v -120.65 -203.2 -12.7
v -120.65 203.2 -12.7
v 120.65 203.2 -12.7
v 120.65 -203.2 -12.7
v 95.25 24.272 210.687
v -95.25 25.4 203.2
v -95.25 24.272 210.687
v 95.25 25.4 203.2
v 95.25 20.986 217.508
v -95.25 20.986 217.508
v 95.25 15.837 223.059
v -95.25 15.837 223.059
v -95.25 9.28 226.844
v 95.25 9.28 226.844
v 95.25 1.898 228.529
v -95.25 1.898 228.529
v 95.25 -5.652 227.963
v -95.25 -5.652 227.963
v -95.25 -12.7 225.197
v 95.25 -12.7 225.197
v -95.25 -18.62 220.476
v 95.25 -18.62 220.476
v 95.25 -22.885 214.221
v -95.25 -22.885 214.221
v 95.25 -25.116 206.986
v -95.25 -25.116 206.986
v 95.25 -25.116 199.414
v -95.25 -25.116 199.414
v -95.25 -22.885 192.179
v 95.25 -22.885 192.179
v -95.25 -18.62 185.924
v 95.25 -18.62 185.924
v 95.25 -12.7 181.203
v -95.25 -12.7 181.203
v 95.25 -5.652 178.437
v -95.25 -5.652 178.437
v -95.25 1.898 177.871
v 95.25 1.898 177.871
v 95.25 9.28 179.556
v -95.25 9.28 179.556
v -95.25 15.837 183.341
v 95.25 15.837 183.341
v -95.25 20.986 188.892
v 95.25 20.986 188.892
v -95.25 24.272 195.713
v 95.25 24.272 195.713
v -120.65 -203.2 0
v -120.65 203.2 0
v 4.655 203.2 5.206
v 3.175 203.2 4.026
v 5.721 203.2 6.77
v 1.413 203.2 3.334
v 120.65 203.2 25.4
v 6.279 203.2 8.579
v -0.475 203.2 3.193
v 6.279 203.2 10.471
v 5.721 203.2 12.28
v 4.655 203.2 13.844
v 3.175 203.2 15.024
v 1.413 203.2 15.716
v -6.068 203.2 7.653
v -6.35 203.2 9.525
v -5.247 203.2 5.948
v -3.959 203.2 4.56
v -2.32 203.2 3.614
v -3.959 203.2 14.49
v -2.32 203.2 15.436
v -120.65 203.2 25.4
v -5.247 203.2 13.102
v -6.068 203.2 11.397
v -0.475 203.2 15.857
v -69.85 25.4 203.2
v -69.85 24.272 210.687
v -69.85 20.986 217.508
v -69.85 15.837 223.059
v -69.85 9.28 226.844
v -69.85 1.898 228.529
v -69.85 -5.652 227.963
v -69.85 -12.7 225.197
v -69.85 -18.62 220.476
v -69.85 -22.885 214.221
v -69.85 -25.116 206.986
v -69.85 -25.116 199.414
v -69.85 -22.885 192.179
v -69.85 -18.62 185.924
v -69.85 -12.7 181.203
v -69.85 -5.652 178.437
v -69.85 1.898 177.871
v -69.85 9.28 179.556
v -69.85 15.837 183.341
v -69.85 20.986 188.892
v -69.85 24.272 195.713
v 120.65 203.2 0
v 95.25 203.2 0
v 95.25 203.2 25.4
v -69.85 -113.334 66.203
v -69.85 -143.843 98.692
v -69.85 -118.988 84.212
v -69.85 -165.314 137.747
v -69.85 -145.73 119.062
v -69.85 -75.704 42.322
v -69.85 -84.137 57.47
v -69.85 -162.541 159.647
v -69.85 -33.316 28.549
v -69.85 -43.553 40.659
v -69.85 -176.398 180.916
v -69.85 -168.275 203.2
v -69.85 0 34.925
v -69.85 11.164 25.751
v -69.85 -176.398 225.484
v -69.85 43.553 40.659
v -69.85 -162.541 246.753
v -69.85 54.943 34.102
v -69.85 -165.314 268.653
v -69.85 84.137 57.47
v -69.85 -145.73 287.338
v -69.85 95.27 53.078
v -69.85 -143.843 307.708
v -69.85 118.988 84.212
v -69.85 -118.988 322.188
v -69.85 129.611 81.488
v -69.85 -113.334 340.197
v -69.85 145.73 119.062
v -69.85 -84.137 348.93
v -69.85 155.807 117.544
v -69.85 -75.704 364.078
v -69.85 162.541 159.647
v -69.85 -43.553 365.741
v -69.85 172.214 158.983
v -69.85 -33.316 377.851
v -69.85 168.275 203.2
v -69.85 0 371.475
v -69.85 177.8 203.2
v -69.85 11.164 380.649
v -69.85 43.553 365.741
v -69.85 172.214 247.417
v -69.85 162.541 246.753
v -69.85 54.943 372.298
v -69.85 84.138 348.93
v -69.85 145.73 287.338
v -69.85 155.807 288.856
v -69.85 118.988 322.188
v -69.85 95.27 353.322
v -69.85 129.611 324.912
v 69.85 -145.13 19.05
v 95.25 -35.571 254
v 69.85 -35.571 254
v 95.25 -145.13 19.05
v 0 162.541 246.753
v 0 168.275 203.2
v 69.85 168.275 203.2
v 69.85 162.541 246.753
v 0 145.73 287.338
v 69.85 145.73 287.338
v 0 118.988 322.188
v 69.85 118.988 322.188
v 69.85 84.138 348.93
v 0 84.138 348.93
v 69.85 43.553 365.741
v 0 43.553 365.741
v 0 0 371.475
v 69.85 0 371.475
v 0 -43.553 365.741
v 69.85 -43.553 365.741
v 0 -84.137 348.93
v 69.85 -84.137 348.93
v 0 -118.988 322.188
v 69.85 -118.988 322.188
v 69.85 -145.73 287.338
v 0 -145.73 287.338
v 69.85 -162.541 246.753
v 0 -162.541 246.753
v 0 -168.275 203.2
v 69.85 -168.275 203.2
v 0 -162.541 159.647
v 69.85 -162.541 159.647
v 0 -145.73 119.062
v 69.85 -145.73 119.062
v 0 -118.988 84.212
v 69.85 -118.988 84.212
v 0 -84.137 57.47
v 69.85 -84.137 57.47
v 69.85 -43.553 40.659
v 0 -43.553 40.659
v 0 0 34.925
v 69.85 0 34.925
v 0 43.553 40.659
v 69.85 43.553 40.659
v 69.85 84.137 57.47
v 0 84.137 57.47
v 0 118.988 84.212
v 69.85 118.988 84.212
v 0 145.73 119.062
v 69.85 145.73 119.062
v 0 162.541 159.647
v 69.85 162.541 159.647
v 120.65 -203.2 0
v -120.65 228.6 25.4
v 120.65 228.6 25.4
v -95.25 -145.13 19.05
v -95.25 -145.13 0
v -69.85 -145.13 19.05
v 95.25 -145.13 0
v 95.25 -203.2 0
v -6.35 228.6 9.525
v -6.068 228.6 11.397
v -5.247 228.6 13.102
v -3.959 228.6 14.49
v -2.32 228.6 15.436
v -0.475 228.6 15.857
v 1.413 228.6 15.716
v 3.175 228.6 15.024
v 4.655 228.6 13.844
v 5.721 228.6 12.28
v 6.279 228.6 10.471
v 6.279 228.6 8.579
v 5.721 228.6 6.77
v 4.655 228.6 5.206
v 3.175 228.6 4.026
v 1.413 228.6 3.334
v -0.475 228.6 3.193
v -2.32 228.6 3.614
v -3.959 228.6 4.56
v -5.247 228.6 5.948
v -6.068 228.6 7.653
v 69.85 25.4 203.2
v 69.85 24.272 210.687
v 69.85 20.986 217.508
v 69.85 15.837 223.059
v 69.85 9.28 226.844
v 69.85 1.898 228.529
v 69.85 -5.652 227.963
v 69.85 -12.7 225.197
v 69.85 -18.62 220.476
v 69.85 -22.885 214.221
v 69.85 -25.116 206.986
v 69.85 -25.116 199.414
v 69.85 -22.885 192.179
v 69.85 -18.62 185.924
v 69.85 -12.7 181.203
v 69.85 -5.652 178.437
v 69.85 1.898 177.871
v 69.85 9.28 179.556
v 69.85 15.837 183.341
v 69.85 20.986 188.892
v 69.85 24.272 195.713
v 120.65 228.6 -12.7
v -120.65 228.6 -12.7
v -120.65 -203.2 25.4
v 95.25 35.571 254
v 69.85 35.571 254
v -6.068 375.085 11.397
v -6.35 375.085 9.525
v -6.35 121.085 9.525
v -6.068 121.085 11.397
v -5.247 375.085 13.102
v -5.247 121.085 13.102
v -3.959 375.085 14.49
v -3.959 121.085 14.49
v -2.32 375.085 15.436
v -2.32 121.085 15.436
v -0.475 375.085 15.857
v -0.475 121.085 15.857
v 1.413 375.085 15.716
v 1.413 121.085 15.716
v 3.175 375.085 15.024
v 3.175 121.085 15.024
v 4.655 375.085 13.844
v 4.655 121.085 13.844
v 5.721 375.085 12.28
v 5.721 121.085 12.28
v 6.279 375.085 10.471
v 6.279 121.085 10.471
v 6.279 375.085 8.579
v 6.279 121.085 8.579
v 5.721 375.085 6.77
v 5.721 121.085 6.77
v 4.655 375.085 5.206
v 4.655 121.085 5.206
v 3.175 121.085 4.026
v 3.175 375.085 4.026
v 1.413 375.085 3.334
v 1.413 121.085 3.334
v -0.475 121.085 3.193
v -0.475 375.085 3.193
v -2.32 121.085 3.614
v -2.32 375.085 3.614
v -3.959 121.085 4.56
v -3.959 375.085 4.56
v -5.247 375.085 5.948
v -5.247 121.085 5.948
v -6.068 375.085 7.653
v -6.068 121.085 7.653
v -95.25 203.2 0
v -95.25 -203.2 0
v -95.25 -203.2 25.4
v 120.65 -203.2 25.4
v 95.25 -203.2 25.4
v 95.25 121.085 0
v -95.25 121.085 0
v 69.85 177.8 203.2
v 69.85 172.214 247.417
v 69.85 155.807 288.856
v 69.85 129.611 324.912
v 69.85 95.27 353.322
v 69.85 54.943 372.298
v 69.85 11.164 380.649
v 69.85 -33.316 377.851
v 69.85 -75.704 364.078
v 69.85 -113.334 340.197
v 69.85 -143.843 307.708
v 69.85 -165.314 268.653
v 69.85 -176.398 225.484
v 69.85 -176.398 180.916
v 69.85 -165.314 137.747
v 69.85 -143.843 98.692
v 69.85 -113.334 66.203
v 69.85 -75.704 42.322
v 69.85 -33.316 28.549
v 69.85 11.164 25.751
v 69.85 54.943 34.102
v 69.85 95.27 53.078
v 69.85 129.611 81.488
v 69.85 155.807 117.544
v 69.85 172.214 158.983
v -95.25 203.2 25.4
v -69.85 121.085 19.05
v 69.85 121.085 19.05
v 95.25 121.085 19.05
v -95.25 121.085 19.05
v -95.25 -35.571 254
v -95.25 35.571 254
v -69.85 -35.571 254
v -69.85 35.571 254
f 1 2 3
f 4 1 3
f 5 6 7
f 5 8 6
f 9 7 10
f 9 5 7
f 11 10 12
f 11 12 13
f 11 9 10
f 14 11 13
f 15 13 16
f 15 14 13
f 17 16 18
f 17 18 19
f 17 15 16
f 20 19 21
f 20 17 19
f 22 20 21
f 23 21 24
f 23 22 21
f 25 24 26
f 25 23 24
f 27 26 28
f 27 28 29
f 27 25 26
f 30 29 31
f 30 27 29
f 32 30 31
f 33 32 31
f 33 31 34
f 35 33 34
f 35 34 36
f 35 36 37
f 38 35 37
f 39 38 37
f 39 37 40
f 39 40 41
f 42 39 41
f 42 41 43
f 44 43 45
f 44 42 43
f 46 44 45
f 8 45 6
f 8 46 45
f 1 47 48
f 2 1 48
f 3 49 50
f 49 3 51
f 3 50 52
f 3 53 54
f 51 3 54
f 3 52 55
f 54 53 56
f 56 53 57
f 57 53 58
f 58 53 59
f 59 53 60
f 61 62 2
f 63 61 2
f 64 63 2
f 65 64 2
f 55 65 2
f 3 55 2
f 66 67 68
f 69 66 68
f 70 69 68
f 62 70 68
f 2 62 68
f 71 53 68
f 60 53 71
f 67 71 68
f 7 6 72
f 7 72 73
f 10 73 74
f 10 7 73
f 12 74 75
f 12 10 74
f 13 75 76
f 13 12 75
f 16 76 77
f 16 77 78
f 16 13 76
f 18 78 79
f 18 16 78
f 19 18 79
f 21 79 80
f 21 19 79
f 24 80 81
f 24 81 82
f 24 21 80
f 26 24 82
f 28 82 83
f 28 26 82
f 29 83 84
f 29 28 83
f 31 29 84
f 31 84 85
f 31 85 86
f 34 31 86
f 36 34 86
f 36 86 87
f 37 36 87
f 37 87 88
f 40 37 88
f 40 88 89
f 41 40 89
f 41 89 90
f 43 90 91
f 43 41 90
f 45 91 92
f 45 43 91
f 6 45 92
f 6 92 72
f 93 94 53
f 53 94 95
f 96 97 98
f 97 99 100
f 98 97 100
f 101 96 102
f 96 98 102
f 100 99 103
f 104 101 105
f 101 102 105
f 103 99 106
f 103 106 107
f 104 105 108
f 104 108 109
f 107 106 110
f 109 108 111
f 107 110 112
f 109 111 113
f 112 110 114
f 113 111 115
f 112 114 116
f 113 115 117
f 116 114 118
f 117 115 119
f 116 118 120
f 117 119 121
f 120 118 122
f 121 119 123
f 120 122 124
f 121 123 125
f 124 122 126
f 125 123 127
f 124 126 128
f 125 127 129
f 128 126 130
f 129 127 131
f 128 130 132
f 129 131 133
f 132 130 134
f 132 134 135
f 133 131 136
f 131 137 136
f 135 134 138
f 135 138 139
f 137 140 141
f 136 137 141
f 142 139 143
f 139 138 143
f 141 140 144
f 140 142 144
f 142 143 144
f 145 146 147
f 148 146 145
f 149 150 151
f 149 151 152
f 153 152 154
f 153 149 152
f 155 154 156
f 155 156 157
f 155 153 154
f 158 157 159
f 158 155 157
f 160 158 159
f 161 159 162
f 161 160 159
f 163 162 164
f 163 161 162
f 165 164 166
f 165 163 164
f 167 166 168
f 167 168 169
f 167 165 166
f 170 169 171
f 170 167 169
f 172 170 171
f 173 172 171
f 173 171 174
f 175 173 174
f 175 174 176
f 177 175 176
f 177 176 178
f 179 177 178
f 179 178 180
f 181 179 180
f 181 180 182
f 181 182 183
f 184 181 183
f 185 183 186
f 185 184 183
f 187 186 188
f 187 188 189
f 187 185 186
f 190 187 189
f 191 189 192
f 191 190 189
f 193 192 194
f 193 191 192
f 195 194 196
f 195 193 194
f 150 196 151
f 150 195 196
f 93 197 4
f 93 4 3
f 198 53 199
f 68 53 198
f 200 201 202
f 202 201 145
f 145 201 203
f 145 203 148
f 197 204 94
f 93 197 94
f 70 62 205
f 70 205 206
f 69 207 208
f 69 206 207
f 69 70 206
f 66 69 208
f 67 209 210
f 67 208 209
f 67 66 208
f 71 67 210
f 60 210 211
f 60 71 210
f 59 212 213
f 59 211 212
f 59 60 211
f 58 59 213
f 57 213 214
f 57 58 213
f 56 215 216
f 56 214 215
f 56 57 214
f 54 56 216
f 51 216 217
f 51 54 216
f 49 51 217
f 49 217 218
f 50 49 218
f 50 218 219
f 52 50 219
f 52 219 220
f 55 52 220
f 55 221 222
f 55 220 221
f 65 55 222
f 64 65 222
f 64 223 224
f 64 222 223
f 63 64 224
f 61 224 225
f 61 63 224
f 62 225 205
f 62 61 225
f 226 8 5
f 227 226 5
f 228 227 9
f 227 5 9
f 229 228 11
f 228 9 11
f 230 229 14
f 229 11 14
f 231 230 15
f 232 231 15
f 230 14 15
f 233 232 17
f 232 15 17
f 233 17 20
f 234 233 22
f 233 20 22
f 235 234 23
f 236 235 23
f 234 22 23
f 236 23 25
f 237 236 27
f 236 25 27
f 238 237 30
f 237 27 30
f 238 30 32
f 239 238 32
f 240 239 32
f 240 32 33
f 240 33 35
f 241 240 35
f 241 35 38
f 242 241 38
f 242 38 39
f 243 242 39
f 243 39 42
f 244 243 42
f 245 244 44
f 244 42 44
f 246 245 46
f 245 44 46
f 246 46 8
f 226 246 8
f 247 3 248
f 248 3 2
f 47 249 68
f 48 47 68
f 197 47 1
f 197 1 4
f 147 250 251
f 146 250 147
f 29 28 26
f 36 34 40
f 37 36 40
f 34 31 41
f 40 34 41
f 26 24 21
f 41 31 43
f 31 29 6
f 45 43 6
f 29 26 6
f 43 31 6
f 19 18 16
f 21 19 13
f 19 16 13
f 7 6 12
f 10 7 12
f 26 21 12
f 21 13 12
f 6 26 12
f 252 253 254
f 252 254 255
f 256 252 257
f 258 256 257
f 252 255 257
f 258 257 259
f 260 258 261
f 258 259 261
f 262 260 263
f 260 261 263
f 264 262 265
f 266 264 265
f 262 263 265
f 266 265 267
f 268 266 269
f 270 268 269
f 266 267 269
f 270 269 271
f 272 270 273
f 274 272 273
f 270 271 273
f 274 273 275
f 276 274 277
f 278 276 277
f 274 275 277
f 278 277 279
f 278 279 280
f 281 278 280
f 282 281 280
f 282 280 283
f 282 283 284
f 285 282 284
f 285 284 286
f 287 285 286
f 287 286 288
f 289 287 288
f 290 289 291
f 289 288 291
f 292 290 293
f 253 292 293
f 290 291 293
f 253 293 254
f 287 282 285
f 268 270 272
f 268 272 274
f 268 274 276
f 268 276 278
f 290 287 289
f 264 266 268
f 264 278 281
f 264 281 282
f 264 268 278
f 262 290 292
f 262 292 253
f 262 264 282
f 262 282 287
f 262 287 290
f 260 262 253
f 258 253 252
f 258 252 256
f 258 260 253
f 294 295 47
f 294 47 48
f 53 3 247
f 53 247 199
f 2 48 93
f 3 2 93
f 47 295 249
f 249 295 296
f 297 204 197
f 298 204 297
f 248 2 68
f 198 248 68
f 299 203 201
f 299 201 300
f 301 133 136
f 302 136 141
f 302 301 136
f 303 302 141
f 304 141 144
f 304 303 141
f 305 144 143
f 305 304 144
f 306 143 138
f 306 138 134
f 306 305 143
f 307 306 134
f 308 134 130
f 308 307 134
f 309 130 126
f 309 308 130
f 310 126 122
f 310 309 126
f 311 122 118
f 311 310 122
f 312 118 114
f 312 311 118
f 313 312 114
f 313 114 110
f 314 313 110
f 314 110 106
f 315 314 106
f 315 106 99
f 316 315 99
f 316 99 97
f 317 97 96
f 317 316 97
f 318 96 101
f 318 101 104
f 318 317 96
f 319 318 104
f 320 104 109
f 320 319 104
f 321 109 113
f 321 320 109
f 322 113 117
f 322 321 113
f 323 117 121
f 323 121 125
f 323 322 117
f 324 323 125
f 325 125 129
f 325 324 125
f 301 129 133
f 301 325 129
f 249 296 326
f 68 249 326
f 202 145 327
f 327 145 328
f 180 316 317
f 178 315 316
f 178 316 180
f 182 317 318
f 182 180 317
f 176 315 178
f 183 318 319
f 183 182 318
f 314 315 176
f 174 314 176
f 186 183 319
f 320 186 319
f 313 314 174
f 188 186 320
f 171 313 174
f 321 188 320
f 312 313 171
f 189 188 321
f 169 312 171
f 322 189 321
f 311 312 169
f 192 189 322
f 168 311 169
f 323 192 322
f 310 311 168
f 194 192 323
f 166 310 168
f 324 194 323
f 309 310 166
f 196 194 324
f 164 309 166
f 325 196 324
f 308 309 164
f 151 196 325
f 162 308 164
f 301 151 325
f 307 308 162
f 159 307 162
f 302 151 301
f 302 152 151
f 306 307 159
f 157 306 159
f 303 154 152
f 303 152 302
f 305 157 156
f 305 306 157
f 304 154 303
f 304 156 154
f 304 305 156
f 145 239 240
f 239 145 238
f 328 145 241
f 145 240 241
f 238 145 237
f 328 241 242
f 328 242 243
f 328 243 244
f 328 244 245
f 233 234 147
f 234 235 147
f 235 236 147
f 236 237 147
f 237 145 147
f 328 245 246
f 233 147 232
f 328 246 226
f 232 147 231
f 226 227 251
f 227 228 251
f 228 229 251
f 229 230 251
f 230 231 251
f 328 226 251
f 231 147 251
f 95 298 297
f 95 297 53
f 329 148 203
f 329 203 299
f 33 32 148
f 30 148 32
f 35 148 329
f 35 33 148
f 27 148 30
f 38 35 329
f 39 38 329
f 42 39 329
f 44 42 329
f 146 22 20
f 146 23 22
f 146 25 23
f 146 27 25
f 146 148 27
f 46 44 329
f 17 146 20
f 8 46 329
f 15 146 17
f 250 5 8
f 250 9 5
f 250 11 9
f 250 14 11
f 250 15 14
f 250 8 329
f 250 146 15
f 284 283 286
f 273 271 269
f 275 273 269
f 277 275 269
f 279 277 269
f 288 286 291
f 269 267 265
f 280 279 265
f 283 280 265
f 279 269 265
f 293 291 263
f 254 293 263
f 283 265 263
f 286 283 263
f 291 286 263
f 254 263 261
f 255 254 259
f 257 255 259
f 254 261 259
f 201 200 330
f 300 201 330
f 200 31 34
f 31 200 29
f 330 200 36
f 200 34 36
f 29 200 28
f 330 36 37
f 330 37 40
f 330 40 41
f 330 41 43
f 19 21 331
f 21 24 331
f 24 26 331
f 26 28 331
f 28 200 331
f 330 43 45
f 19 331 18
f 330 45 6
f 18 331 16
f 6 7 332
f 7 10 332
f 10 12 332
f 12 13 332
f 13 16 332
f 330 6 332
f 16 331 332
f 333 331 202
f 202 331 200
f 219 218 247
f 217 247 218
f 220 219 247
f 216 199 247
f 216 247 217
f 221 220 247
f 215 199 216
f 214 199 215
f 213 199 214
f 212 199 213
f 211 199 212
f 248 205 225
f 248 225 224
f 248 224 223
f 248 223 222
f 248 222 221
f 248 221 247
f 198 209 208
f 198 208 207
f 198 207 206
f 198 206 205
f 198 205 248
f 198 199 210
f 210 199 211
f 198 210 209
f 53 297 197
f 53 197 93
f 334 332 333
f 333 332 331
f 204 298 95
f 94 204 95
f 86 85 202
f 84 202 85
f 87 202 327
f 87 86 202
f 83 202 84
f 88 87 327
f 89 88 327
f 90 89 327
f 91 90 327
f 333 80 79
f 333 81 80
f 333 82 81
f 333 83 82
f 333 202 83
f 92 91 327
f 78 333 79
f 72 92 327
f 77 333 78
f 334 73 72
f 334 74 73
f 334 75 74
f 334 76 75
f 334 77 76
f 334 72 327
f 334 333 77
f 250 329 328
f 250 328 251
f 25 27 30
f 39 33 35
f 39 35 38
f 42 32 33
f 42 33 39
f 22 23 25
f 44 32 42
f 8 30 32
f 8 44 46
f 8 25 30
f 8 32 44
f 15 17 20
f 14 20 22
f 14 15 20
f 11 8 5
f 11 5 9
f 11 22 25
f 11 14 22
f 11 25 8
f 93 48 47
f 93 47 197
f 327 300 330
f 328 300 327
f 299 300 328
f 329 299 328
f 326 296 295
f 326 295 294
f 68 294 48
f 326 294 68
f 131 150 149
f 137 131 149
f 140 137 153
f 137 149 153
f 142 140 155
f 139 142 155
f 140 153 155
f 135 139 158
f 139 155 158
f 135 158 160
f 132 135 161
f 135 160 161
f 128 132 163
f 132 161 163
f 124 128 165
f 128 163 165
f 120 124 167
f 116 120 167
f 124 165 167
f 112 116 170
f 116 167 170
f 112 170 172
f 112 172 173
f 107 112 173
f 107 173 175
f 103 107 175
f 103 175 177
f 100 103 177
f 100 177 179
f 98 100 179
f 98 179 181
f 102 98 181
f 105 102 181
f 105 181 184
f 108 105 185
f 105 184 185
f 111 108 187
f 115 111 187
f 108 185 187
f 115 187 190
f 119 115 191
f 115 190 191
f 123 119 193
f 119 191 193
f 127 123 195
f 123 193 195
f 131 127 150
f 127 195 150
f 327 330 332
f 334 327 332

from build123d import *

# Parameters (mm, degrees)
F4_R          = 177.8
F4_R_2        = 168.275
F5_DEPTH      = 69.85
F5_DEPTH_BACK = 69.85
F6_W          = 241.3
F6_H          = 406.4
F7_DEPTH      = 12.7
F4_R_3        = 25.4
F8_DEPTH      = 95.25
F8_DEPTH_BACK = 95.25
F9_W          = 266.2148767065
F9_H          = 19.05
F9_R          = 25.4
F10_DEPTH     = 25.4
F12_DEPTH     = 190.5
F13_W         = 406.4
F13_H         = 25.4
F14_DEPTH     = 25.4
F16_R         = 6.35
F17_DEPTH     = 254
F18_W         = 241.3
F18_H         = 38.1
F19_DEPTH     = 25.4


with BuildPart() as f5:
    # F4 (on Right) → F5 (new body, two sides)
    with BuildSketch(Plane.YZ) as f5_sk:
        with Locations((0, 203.2)):
            Circle(F4_R)
        with Locations((0, 203.2)):
            Circle(F4_R_2, mode=Mode.SUBTRACT)
    extrude(amount=F5_DEPTH)
    extrude(f5_sk.sketch, amount=-F5_DEPTH_BACK)


with BuildPart() as f7:
    # F6 (on Top) → F7 (new body)
    with BuildSketch(Plane.XY):
        Rectangle(F6_W, F6_H)
    extrude(amount=-F7_DEPTH)


with BuildPart() as f8:
    # F4 (on Right) → F8 (new body, two sides)
    with BuildSketch(Plane.YZ) as f8_sk:
        with Locations((0, 203.2)):
            Circle(F4_R_3)
    extrude(amount=F8_DEPTH)
    extrude(f8_sk.sketch, amount=-F8_DEPTH_BACK)


with BuildPart() as f10:
    # F9 (on face) → F10 (new body)
    with BuildSketch(Plane.YZ.offset(95.25)):
        with Locations((-12.0220888713, 9.525)):
            Rectangle(F9_W, F9_H)
        Polygon((-35.5705429411, 254), (-145.1295272246, 19.05), (121.0853494819, 19.05), (35.5705429411, 254), align=None)
        with Locations((0, 203.2)):
            Circle(F9_R, mode=Mode.SUBTRACT)
    extrude(amount=-F10_DEPTH)


with BuildPart() as f11_1:
    # F11: instance of F10
    add(f10.part.mirror(Plane.YZ))


with BuildPart() as f10_1:
    add(f10.part)

    add(f11_1.part)  # F12 merges F11_1
    # F9 (on face) → F12 (join)
    with BuildSketch(Plane.YZ.offset(95.25)):
        with Locations((-12.0220888713, 9.525)):
            Rectangle(F9_W, F9_H)
    extrude(amount=-F12_DEPTH)


with BuildPart() as f14:
    # F13 (on face) → F14 (new body)
    with BuildSketch(Plane.YZ.offset(95.25)):
        with Locations((0, 12.7)):
            Rectangle(F13_W, F13_H)
    extrude(amount=F14_DEPTH)


with BuildPart() as f15_1:
    # F15: instance of F14
    add(f14.part.mirror(Plane.YZ))


with BuildPart() as f17:
    # F16 (on face) → F17 (new body)
    with BuildSketch(Plane(origin=(0, 121.0853494819, 0), x_dir=(-1, 0, 0), z_dir=(0, 1, 0))):
        with Locations((0, 9.525)):
            Circle(F16_R)
    extrude(amount=F17_DEPTH)


with BuildPart() as f19:
    # F18 (on face) → F19 (new body)
    with BuildSketch(Plane(origin=(0, 203.2, 0), x_dir=(-1, 0, 0), z_dir=(0, 1, 0))):
        with Locations((0, 6.35)):
            Rectangle(F18_W, F18_H)
    extrude(amount=F19_DEPTH)

    # F20: cut F17
    add(f17.part, mode=Mode.SUBTRACT)


solid = Compound([f5.part, f7.part, f8.part, f10_1.part, f14.part, f15_1.part, f17.part, f19.part])
